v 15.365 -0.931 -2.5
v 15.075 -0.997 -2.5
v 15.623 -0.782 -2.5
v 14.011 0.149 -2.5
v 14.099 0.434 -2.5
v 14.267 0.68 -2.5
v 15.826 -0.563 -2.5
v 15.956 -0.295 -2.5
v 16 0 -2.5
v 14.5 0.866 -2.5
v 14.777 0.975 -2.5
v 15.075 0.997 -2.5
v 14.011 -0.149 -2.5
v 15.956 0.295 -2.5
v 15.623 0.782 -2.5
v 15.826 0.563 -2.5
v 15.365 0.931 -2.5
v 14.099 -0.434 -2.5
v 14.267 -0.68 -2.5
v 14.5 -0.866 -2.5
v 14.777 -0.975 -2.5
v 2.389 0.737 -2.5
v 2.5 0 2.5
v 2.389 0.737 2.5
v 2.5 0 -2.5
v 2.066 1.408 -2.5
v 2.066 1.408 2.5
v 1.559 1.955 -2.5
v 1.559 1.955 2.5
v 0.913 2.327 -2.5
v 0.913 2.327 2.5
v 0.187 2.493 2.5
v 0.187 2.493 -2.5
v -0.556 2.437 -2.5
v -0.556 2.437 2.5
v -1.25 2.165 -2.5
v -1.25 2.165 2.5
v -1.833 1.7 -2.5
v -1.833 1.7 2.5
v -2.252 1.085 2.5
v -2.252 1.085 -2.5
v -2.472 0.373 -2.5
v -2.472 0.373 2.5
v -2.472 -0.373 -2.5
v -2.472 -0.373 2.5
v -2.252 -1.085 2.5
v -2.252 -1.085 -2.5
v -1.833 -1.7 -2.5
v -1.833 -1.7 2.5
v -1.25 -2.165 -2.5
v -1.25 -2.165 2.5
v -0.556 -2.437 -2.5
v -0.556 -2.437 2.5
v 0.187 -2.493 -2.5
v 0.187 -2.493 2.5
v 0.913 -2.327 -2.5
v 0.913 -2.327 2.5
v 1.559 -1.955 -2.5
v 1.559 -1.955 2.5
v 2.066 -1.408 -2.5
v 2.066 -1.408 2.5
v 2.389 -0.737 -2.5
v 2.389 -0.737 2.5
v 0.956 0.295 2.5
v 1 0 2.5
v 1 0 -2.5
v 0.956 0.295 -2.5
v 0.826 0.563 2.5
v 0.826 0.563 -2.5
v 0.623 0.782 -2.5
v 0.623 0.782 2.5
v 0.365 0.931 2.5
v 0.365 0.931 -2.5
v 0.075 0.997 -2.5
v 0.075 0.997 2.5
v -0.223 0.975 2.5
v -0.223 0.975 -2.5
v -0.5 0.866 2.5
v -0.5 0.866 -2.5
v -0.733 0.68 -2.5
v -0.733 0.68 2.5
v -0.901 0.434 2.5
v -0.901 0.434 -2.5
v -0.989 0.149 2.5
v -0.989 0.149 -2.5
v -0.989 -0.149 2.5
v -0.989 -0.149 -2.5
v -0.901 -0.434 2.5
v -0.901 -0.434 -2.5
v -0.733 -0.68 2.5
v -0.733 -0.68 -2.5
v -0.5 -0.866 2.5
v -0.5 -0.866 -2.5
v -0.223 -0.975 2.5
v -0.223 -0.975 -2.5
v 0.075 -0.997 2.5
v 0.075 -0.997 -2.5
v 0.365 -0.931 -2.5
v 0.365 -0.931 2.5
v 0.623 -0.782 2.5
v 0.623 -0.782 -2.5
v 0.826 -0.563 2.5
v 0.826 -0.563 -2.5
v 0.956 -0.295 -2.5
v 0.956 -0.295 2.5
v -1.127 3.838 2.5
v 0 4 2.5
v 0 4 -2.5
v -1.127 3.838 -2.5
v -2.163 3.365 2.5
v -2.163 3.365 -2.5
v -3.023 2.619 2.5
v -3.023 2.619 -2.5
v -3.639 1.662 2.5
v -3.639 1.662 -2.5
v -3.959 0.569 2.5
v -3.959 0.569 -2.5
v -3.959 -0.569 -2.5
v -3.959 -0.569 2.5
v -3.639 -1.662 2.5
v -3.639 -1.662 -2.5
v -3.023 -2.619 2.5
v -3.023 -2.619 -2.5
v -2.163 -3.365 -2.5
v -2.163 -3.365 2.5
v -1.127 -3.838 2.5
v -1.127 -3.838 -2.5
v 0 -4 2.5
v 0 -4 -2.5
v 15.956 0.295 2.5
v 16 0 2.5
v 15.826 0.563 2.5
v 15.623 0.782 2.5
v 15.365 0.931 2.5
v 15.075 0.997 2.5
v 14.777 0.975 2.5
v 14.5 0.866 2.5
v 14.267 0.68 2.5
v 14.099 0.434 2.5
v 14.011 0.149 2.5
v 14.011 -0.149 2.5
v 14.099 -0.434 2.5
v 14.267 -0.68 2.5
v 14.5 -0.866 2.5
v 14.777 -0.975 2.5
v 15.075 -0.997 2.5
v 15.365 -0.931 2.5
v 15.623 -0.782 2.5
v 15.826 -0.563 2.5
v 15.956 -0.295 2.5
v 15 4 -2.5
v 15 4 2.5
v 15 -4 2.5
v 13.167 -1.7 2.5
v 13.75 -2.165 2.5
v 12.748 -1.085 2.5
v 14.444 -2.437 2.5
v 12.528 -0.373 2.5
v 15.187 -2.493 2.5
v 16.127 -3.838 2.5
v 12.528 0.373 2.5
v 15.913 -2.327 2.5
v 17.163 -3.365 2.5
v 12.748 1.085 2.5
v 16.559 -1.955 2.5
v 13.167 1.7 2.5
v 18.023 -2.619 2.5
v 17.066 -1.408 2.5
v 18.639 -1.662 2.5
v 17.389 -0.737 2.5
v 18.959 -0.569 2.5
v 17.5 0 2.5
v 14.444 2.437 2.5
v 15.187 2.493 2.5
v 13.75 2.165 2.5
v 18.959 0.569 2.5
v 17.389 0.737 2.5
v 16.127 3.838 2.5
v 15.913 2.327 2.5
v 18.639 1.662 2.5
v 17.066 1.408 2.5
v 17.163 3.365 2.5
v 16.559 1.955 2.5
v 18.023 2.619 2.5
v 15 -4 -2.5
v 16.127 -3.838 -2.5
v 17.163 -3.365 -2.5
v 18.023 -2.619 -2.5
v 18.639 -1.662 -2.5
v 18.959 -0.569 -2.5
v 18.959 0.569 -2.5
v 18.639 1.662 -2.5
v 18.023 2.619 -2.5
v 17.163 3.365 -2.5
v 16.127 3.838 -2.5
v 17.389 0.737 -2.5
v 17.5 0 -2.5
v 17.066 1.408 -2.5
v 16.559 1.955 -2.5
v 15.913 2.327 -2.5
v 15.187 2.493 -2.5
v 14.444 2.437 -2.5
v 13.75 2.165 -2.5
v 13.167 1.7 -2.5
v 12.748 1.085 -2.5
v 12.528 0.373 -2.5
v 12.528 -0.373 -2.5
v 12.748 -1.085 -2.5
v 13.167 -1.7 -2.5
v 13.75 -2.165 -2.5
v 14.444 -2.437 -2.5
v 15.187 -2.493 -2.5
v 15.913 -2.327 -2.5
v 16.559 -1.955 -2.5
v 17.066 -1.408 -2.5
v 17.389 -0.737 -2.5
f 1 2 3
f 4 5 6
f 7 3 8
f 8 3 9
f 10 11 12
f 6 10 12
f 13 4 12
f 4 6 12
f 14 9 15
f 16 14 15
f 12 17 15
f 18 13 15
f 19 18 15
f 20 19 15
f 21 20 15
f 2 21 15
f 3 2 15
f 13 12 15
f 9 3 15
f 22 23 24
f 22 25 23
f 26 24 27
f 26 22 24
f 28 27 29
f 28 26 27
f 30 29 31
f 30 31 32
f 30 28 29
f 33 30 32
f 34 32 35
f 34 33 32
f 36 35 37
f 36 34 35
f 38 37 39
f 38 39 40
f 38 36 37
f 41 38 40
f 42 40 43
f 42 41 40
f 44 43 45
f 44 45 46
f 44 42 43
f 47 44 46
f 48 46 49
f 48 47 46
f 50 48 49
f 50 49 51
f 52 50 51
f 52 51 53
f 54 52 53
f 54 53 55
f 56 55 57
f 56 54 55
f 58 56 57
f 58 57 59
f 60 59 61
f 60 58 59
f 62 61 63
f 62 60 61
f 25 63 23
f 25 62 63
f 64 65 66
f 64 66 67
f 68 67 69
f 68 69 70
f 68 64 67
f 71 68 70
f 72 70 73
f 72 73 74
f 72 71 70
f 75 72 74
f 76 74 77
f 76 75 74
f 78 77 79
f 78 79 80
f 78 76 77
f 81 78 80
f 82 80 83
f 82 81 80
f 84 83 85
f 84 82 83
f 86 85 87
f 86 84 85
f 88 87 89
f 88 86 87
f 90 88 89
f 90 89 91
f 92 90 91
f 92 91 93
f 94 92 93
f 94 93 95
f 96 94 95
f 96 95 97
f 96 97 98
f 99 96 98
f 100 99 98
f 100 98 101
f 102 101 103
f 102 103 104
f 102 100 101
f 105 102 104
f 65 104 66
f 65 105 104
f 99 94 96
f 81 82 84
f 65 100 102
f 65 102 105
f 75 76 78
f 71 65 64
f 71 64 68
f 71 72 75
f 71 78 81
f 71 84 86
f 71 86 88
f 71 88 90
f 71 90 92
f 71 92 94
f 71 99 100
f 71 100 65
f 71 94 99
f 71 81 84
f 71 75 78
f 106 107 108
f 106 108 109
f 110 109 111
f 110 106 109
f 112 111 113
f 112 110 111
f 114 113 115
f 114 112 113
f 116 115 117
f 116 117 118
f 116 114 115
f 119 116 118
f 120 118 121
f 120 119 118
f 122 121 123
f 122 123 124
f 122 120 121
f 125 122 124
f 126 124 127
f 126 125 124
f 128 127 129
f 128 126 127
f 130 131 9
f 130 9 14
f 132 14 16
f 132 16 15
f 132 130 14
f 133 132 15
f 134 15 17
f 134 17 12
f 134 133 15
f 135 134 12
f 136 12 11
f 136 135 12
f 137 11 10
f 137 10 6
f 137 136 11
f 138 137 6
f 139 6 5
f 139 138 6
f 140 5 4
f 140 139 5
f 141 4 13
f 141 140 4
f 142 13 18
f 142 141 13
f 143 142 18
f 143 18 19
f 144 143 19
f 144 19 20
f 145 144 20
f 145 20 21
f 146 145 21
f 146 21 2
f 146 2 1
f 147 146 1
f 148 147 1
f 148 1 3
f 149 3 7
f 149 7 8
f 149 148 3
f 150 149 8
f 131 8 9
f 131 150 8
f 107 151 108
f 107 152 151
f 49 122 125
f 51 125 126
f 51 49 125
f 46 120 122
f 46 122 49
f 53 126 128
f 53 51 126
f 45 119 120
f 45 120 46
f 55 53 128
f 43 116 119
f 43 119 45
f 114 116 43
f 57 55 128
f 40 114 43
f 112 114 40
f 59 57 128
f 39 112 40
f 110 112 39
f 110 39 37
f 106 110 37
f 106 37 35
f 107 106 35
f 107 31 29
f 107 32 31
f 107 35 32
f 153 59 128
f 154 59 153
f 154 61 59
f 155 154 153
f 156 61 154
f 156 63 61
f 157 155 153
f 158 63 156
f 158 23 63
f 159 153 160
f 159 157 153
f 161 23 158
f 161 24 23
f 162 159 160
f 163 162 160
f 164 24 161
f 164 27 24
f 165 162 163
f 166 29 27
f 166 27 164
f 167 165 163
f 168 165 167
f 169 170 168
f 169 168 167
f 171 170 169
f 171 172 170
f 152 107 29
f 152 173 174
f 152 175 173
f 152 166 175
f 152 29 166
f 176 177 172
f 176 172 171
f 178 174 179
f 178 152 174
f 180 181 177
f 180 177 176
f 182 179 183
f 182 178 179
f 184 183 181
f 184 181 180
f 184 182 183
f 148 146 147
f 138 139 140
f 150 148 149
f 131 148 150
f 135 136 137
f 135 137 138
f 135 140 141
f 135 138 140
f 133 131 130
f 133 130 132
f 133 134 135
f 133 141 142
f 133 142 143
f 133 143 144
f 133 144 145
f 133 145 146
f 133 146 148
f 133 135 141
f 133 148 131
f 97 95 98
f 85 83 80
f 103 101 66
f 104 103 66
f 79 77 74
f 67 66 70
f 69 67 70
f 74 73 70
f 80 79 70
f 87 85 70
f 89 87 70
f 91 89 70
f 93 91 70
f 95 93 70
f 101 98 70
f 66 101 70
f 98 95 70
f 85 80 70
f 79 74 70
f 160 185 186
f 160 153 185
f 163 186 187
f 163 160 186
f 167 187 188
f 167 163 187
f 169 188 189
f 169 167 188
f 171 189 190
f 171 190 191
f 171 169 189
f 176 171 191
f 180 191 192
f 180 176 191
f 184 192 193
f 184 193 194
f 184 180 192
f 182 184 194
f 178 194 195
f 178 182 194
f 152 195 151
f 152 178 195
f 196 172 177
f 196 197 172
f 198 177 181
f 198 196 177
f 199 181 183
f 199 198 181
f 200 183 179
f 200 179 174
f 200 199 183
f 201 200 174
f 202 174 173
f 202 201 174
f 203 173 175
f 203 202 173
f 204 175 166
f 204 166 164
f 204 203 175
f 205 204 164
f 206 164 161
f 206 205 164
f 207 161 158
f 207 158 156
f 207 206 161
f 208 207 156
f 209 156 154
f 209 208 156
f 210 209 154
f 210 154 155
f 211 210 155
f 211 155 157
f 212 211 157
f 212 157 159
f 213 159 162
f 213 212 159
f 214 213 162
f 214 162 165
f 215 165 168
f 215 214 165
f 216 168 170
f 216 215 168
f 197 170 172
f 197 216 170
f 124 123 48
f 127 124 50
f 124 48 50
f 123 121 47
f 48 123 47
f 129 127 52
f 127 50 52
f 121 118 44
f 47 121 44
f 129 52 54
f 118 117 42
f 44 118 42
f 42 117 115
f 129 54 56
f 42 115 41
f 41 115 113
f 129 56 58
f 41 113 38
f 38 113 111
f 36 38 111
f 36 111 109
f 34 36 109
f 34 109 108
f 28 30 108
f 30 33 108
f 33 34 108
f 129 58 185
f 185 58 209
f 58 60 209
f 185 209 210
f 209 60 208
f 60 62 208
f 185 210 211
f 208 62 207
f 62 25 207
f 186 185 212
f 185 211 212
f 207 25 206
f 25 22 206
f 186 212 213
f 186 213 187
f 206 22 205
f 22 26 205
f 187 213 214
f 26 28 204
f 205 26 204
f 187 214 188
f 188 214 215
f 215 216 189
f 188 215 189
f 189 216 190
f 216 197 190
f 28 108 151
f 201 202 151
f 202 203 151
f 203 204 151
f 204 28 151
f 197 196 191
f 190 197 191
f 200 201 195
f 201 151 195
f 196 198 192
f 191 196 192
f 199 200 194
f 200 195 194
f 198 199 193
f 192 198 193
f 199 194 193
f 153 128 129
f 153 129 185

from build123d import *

# Parameters (mm, degrees)
F0_R     = 2.5
F1_DEPTH = 2.5
F2_R     = 1
F3_DEPTH = 5


with BuildPart() as f1:
    # F0 (on Top) → F1 (new body, symmetric)
    with BuildSketch(Plane.XY):
        with BuildLine():
            Line((15, 4), (0, 4))
            ThreePointArc((0, 4), (-4, 0), (0, -4))
            Line((0, -4), (15, -4))
            ThreePointArc((15, -4), (19, 0), (15, 4))
        make_face()
        Circle(F0_R, mode=Mode.SUBTRACT)
        with Locations((15, 0)):
            Circle(F0_R, mode=Mode.SUBTRACT)
    extrude(amount=F1_DEPTH, both=True)


with BuildPart() as f3:
    # F2 (on face) → F3 (new body)
    with BuildSketch(Plane.XY.offset(2.5)):
        Circle(F2_R)
        with Locations((15, 0)):
            Circle(F2_R)
    extrude(amount=-F3_DEPTH)


solid = Compound([f1.part, f3.part])
